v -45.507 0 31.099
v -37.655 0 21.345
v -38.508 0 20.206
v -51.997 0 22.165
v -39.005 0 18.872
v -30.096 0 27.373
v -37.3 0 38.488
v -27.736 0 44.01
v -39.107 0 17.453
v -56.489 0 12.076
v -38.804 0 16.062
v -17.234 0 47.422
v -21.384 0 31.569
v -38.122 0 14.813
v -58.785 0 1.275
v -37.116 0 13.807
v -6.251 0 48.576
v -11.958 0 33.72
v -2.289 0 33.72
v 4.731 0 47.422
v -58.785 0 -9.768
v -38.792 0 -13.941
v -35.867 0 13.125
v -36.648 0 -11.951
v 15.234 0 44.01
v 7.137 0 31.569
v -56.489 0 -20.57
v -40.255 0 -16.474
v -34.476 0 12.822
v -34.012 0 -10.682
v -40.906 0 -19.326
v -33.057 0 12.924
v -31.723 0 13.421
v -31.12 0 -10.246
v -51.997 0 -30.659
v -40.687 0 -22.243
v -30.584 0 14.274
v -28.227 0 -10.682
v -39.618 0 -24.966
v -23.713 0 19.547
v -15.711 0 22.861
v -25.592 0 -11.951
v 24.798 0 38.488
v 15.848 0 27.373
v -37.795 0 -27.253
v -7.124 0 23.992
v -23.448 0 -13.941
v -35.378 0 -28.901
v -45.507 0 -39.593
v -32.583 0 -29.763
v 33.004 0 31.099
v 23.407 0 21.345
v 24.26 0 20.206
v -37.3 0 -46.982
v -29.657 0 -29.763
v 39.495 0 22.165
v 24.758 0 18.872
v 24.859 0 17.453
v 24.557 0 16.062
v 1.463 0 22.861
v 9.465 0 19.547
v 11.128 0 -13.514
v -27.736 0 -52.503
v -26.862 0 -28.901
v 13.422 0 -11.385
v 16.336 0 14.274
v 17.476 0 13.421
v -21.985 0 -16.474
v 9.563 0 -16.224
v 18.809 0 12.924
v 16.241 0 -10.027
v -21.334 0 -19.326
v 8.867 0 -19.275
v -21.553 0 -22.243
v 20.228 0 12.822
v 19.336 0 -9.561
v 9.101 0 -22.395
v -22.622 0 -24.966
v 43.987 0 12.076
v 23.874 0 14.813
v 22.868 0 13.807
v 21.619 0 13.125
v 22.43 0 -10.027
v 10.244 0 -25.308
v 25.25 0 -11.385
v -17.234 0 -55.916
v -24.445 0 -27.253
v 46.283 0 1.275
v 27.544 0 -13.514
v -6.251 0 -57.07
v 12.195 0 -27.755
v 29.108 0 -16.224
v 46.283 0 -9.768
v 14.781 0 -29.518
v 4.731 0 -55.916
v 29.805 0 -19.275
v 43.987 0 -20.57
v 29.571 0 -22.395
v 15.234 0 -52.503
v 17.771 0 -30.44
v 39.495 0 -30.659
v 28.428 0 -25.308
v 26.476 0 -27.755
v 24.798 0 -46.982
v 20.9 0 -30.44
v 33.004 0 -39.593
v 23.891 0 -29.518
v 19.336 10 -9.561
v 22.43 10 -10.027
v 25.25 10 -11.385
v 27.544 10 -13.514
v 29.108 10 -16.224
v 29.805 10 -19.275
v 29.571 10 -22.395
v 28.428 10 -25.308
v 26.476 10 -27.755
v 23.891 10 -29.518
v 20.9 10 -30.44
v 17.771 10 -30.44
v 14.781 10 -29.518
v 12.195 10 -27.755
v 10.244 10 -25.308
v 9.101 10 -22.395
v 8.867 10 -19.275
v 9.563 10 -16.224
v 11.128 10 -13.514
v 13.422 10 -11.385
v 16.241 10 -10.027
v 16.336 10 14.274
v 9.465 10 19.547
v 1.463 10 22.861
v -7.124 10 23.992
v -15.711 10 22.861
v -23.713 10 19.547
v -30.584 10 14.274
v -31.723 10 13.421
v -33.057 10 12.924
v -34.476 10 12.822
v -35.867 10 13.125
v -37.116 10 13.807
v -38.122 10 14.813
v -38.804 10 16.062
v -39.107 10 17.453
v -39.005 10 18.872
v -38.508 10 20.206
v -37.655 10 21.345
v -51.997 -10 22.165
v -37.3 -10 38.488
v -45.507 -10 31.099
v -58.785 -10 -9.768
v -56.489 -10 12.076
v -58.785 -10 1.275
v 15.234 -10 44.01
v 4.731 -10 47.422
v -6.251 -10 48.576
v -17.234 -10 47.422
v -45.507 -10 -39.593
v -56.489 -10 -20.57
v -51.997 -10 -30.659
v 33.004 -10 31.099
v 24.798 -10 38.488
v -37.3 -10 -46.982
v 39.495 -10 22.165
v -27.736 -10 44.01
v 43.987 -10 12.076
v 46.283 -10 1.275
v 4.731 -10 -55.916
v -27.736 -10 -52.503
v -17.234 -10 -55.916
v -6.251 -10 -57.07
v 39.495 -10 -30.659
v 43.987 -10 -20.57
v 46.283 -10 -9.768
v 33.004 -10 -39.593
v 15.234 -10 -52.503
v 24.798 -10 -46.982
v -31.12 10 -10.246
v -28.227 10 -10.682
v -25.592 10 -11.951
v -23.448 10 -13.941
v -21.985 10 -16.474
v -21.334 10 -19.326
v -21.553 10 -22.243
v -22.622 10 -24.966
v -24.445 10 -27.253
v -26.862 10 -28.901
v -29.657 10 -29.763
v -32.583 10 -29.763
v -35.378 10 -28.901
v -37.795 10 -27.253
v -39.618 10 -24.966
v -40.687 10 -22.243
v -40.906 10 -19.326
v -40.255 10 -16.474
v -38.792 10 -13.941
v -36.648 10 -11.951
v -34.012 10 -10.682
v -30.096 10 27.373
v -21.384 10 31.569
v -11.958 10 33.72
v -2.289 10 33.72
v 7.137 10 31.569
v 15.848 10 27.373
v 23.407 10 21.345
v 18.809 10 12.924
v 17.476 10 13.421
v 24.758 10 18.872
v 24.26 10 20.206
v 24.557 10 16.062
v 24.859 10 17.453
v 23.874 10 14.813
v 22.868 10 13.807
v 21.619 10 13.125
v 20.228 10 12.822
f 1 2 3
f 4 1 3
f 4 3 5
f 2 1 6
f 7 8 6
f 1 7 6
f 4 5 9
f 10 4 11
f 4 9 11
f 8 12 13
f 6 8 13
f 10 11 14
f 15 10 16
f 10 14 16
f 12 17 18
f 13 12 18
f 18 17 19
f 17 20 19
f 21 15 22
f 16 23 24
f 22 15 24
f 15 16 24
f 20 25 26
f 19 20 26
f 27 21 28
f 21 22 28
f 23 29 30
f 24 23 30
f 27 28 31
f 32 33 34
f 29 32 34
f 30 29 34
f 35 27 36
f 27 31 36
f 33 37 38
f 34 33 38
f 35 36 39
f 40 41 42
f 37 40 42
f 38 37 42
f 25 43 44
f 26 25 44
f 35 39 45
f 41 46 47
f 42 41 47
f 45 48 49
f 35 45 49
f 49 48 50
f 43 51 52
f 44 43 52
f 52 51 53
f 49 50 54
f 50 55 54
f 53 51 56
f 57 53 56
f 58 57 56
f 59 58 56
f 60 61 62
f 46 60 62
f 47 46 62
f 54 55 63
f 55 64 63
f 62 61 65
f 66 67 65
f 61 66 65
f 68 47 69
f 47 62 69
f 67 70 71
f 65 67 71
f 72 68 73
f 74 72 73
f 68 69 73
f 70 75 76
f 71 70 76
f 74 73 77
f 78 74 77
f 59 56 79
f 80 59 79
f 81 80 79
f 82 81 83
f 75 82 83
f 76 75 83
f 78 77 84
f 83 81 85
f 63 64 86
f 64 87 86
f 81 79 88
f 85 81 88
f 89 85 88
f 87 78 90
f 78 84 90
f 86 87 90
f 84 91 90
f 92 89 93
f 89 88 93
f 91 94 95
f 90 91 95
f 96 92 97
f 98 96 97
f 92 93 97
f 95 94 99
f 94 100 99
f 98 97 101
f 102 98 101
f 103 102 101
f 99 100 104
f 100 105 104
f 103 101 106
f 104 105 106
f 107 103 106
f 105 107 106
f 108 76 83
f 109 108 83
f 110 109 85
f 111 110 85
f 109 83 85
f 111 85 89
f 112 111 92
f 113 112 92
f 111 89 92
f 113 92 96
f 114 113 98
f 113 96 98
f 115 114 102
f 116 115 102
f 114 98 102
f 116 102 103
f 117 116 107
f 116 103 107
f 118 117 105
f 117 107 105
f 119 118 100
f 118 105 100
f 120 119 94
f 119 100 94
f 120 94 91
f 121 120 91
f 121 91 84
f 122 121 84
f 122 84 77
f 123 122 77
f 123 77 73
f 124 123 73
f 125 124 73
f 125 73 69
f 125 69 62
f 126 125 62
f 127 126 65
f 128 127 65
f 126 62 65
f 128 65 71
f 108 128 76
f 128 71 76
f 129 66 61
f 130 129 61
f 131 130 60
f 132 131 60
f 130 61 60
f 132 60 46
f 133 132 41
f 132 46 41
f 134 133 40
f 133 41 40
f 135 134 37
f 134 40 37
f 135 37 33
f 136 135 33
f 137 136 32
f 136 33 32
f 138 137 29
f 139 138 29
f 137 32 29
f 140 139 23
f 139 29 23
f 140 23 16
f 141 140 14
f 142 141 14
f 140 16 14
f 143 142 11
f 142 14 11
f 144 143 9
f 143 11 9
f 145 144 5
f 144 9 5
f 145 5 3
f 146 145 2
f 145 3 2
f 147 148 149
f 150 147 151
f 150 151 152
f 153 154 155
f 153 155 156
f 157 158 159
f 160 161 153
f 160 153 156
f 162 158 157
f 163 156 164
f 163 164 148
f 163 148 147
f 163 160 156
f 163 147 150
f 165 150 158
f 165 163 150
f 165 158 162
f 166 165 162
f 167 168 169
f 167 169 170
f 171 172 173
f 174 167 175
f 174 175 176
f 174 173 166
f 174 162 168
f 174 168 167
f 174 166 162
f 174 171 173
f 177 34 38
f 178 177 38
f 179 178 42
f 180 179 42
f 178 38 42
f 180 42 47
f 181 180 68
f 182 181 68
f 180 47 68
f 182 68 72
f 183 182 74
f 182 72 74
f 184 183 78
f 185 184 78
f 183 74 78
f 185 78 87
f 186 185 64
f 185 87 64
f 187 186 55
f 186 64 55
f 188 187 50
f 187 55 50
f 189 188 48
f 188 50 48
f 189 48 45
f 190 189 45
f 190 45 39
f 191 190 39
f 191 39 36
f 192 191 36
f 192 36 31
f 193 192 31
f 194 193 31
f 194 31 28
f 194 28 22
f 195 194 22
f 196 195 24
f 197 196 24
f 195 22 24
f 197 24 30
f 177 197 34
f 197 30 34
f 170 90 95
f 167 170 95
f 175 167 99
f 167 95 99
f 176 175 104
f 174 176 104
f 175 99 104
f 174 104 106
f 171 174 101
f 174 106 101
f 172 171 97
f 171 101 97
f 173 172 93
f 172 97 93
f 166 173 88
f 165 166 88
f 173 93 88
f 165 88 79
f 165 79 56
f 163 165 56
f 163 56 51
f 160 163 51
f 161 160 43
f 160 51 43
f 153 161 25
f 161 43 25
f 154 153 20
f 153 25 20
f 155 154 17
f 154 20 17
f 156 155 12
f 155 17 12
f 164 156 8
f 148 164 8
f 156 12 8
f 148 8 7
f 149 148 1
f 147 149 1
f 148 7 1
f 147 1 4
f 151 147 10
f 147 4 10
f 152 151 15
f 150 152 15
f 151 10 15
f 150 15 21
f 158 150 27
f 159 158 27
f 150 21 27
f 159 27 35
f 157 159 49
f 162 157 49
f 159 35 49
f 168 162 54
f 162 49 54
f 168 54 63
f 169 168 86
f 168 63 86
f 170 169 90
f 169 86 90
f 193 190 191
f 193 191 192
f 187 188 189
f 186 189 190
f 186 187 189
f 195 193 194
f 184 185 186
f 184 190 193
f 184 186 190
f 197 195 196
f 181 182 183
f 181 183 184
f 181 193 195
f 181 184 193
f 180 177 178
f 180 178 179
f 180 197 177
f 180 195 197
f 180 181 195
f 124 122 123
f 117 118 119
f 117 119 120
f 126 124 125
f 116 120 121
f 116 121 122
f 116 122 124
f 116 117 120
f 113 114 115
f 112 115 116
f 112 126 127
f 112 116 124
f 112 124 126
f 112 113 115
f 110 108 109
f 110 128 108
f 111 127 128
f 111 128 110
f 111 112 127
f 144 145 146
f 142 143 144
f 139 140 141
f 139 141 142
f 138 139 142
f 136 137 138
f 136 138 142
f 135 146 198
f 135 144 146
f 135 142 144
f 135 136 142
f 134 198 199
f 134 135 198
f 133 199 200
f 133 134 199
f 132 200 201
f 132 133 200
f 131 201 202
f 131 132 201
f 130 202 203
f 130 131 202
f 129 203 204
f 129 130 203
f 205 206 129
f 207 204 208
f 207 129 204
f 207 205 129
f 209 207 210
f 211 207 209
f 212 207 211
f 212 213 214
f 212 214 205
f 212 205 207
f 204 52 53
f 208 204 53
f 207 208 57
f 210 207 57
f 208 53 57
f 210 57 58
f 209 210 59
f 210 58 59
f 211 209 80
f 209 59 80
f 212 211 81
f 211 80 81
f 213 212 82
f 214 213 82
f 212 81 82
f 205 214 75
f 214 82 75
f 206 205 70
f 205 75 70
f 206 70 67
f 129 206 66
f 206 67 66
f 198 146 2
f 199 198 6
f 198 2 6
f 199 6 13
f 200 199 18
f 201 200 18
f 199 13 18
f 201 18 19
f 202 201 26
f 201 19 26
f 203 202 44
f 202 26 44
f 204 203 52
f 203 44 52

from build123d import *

# Parameters (mm, degrees)
SKETCH1_R             = 9.813093158
BOSS_EXTRUDE1_DEPTH   = 10
SKETCH1_R_2           = 10.498292465
BOSS_EXTRUDE1_2_DEPTH = 10
BOSS_EXTRUDE1_3_DEPTH = 10
SKETCH2_R             = 52.823312211
BOSS_EXTRUDE2_DEPTH   = 10


with BuildPart() as part:
    # Sketch1 → Boss-Extrude1 (new body)
    with BuildSketch(Plane(origin=(0, 0, 0), x_dir=(1, 0, 0), z_dir=(0, 1, 0))):
        with Locations(Location((-31.119938379, 20.059237389, 0), (0, 0, 270))):
            Circle(SKETCH1_R)
    extrude(amount=BOSS_EXTRUDE1_DEPTH)



with BuildPart() as body_2:
    # Sketch1 → Boss-Extrude1 2 (new body)
    with BuildSketch(Plane(origin=(0, 0, 0), x_dir=(1, 0, 0), z_dir=(0, 1, 0))):
        with Locations(Location((19.335746107, 20.059237389, 0), (0, 0, 270))):
            Circle(SKETCH1_R_2)
    extrude(amount=BOSS_EXTRUDE1_2_DEPTH)


with BuildPart() as body_3:
    # Sketch1 → Boss-Extrude1 3 (new body)
    with BuildSketch(Plane(origin=(0, 0, 0), x_dir=(1, 0, 0), z_dir=(0, 1, 0))):
        with BuildLine():
            ThreePointArc((-37.654984417, -21.345137195), (-7.123841316, -33.991550742), (23.407301786, -21.345137195))
            ThreePointArc((23.407301786, -21.345137195), (23.407301786, -14.274069383), (16.336233974, -14.274069383))
            ThreePointArc((16.336233974, -14.274069383), (-7.123841316, -23.991550742), (-30.583916606, -14.274069383))
            ThreePointArc((-30.583916606, -14.274069383), (-37.654984417, -14.274069383), (-37.654984417, -21.345137195))
        make_face()
    extrude(amount=BOSS_EXTRUDE1_3_DEPTH)


with BuildPart() as part_1:
    add(part.part)

    add(body_2.part)  # Boss-Extrude2 merges body 2

    add(body_3.part)  # Boss-Extrude2 merges body 3
    # Sketch2 → Boss-Extrude2 (add)
    with BuildSketch(Plane.XZ):
        with Locations(Location((-6.251130616, -4.246879691, 0), (0, 0, 270))):
            Circle(SKETCH2_R)
    extrude(amount=BOSS_EXTRUDE2_DEPTH)


solid = part_1.part
